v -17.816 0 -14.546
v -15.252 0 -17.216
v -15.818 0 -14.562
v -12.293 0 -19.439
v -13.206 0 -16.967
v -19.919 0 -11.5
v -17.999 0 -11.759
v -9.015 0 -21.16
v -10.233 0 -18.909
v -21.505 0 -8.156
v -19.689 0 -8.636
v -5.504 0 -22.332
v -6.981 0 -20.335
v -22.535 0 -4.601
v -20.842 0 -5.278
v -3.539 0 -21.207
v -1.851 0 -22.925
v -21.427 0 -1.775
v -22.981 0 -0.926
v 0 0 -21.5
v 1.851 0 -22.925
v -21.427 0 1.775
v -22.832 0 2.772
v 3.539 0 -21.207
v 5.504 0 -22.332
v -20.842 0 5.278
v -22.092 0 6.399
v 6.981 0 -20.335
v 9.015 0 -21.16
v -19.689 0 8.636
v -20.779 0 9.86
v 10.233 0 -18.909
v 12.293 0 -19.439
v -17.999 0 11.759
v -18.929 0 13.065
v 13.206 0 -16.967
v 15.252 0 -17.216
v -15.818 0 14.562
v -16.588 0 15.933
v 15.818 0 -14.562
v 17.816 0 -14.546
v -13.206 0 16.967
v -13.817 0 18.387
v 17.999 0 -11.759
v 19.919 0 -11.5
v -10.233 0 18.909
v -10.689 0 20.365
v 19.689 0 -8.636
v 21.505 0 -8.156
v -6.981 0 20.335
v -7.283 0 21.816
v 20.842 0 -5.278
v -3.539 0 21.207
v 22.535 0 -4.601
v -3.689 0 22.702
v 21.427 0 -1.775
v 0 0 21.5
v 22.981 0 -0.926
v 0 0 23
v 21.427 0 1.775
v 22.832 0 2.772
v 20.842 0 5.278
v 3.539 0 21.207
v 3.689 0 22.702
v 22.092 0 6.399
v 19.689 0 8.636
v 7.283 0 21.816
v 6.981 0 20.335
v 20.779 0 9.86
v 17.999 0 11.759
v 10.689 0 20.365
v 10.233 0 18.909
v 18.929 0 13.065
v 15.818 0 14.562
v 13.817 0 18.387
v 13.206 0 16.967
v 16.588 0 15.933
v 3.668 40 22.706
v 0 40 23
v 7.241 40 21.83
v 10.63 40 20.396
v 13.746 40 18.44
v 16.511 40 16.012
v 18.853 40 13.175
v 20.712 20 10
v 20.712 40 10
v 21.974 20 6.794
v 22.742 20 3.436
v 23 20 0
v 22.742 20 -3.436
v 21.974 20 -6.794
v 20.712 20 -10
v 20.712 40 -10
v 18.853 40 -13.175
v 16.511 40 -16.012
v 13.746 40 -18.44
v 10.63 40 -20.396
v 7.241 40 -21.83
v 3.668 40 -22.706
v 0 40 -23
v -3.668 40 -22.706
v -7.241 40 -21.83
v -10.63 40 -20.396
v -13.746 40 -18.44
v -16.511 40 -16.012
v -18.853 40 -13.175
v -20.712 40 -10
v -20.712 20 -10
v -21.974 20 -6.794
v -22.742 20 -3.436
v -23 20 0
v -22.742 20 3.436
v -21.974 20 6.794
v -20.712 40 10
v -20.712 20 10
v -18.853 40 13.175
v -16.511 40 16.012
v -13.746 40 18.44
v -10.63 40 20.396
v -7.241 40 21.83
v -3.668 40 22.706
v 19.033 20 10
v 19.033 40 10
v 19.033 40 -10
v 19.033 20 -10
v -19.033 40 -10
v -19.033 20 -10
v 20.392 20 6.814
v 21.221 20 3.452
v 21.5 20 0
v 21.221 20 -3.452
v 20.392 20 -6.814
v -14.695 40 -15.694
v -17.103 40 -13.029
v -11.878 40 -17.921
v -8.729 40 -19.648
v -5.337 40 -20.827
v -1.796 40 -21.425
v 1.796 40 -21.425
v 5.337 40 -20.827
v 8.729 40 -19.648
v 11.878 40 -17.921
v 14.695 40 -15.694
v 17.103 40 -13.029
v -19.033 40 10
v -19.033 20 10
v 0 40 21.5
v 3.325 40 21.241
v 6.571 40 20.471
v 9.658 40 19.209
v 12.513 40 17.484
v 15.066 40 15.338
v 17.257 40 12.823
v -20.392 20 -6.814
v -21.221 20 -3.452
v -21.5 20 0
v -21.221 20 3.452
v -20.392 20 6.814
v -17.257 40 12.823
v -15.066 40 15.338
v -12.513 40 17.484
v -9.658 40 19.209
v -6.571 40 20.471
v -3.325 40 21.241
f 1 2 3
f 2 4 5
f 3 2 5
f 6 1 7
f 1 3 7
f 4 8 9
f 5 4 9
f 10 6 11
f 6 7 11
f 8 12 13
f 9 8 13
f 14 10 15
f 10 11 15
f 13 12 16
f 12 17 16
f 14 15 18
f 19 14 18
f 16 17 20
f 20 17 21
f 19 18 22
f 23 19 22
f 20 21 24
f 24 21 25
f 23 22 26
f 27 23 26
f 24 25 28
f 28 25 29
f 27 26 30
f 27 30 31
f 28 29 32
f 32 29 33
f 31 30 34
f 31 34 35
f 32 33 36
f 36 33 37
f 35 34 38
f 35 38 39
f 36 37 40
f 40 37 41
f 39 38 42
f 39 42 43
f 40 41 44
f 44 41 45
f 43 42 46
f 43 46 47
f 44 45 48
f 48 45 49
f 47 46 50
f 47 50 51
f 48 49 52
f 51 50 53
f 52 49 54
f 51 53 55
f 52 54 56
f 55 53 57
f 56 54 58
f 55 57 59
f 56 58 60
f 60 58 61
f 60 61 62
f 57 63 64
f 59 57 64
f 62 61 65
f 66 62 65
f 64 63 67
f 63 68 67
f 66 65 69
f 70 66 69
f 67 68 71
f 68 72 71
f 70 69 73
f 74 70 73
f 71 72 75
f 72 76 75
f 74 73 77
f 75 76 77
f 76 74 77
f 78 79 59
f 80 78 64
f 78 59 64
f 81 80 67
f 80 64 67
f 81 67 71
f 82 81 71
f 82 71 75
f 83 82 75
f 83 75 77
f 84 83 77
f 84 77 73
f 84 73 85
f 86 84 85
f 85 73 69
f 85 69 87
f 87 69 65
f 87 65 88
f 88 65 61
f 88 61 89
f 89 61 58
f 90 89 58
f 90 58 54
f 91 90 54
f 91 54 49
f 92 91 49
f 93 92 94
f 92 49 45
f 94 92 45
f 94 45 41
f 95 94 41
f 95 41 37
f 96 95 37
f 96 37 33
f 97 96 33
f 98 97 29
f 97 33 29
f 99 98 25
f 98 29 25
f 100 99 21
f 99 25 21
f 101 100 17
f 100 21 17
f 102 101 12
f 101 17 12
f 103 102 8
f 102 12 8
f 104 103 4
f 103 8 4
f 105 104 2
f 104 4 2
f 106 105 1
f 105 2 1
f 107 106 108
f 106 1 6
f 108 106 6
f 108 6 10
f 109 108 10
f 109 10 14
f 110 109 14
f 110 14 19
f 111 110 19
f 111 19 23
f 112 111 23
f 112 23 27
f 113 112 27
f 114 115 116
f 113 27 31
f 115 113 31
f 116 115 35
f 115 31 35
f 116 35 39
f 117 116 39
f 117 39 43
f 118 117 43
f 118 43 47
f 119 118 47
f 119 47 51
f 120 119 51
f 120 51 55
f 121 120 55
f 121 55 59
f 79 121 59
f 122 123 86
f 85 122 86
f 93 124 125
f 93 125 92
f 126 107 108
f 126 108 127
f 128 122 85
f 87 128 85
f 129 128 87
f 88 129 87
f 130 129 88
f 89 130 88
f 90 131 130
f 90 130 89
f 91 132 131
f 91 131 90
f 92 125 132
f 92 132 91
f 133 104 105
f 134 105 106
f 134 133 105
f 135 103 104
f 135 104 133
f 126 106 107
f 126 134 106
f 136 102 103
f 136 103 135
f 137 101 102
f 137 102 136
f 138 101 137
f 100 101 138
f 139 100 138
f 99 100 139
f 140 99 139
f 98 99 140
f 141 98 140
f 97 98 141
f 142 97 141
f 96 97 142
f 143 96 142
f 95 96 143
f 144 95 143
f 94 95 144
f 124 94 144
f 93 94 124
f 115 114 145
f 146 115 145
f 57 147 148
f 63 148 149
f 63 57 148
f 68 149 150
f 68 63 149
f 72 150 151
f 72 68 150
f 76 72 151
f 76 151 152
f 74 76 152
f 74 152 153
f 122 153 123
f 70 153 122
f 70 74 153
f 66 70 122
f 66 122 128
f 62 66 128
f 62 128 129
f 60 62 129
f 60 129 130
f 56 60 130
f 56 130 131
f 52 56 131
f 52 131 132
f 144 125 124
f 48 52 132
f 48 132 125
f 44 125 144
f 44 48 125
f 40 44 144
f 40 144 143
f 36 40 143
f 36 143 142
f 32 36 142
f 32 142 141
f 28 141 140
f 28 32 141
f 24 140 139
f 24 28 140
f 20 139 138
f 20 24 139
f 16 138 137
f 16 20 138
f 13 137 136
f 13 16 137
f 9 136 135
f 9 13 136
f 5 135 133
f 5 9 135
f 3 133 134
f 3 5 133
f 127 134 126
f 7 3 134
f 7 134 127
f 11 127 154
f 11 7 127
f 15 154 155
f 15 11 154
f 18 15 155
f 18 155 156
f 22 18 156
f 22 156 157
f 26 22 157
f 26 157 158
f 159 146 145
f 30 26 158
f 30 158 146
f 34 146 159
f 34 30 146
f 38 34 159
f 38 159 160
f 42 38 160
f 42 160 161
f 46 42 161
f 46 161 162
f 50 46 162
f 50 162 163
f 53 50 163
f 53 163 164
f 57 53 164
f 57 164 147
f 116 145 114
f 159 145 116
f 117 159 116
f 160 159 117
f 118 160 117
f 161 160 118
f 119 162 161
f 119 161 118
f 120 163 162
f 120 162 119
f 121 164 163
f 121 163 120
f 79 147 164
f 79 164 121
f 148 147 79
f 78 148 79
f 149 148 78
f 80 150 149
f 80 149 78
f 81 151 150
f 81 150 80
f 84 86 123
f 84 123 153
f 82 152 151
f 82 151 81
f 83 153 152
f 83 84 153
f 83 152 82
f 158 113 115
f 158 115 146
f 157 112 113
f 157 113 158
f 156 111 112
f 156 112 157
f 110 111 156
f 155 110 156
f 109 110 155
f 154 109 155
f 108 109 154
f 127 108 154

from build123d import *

# Parameters (mm, degrees)
SKETCH1_R           = 23
SKETCH1_R_2         = 21.5
BOSS_EXTRUDE1_DEPTH = 40
SKETCH2_W           = 60
SKETCH2_H           = 20
CUT_EXTRUDE1_DEPTH  = 20


with BuildPart() as part:
    # Sketch1 → Boss-Extrude1 (new body)
    with BuildSketch(Plane(origin=(0, 0, 0), x_dir=(1, 0, 0), z_dir=(0, 1, 0))):
        with Locations(Location((0, 0, 0), (0, 0, 270))):
            Circle(SKETCH1_R)
        with Locations(Location((0, 0, 0), (0, 0, 270))):
            Circle(SKETCH1_R_2, mode=Mode.SUBTRACT)
    extrude(amount=BOSS_EXTRUDE1_DEPTH)

    # Sketch2 → Cut-Extrude1 (cut)
    with BuildSketch(Plane(origin=(0, 40, 0), x_dir=(1, 0, 0), z_dir=(0, 1, 0))):
        Rectangle(SKETCH2_W, SKETCH2_H)
    extrude(amount=-CUT_EXTRUDE1_DEPTH, mode=Mode.SUBTRACT)


solid = part.part
